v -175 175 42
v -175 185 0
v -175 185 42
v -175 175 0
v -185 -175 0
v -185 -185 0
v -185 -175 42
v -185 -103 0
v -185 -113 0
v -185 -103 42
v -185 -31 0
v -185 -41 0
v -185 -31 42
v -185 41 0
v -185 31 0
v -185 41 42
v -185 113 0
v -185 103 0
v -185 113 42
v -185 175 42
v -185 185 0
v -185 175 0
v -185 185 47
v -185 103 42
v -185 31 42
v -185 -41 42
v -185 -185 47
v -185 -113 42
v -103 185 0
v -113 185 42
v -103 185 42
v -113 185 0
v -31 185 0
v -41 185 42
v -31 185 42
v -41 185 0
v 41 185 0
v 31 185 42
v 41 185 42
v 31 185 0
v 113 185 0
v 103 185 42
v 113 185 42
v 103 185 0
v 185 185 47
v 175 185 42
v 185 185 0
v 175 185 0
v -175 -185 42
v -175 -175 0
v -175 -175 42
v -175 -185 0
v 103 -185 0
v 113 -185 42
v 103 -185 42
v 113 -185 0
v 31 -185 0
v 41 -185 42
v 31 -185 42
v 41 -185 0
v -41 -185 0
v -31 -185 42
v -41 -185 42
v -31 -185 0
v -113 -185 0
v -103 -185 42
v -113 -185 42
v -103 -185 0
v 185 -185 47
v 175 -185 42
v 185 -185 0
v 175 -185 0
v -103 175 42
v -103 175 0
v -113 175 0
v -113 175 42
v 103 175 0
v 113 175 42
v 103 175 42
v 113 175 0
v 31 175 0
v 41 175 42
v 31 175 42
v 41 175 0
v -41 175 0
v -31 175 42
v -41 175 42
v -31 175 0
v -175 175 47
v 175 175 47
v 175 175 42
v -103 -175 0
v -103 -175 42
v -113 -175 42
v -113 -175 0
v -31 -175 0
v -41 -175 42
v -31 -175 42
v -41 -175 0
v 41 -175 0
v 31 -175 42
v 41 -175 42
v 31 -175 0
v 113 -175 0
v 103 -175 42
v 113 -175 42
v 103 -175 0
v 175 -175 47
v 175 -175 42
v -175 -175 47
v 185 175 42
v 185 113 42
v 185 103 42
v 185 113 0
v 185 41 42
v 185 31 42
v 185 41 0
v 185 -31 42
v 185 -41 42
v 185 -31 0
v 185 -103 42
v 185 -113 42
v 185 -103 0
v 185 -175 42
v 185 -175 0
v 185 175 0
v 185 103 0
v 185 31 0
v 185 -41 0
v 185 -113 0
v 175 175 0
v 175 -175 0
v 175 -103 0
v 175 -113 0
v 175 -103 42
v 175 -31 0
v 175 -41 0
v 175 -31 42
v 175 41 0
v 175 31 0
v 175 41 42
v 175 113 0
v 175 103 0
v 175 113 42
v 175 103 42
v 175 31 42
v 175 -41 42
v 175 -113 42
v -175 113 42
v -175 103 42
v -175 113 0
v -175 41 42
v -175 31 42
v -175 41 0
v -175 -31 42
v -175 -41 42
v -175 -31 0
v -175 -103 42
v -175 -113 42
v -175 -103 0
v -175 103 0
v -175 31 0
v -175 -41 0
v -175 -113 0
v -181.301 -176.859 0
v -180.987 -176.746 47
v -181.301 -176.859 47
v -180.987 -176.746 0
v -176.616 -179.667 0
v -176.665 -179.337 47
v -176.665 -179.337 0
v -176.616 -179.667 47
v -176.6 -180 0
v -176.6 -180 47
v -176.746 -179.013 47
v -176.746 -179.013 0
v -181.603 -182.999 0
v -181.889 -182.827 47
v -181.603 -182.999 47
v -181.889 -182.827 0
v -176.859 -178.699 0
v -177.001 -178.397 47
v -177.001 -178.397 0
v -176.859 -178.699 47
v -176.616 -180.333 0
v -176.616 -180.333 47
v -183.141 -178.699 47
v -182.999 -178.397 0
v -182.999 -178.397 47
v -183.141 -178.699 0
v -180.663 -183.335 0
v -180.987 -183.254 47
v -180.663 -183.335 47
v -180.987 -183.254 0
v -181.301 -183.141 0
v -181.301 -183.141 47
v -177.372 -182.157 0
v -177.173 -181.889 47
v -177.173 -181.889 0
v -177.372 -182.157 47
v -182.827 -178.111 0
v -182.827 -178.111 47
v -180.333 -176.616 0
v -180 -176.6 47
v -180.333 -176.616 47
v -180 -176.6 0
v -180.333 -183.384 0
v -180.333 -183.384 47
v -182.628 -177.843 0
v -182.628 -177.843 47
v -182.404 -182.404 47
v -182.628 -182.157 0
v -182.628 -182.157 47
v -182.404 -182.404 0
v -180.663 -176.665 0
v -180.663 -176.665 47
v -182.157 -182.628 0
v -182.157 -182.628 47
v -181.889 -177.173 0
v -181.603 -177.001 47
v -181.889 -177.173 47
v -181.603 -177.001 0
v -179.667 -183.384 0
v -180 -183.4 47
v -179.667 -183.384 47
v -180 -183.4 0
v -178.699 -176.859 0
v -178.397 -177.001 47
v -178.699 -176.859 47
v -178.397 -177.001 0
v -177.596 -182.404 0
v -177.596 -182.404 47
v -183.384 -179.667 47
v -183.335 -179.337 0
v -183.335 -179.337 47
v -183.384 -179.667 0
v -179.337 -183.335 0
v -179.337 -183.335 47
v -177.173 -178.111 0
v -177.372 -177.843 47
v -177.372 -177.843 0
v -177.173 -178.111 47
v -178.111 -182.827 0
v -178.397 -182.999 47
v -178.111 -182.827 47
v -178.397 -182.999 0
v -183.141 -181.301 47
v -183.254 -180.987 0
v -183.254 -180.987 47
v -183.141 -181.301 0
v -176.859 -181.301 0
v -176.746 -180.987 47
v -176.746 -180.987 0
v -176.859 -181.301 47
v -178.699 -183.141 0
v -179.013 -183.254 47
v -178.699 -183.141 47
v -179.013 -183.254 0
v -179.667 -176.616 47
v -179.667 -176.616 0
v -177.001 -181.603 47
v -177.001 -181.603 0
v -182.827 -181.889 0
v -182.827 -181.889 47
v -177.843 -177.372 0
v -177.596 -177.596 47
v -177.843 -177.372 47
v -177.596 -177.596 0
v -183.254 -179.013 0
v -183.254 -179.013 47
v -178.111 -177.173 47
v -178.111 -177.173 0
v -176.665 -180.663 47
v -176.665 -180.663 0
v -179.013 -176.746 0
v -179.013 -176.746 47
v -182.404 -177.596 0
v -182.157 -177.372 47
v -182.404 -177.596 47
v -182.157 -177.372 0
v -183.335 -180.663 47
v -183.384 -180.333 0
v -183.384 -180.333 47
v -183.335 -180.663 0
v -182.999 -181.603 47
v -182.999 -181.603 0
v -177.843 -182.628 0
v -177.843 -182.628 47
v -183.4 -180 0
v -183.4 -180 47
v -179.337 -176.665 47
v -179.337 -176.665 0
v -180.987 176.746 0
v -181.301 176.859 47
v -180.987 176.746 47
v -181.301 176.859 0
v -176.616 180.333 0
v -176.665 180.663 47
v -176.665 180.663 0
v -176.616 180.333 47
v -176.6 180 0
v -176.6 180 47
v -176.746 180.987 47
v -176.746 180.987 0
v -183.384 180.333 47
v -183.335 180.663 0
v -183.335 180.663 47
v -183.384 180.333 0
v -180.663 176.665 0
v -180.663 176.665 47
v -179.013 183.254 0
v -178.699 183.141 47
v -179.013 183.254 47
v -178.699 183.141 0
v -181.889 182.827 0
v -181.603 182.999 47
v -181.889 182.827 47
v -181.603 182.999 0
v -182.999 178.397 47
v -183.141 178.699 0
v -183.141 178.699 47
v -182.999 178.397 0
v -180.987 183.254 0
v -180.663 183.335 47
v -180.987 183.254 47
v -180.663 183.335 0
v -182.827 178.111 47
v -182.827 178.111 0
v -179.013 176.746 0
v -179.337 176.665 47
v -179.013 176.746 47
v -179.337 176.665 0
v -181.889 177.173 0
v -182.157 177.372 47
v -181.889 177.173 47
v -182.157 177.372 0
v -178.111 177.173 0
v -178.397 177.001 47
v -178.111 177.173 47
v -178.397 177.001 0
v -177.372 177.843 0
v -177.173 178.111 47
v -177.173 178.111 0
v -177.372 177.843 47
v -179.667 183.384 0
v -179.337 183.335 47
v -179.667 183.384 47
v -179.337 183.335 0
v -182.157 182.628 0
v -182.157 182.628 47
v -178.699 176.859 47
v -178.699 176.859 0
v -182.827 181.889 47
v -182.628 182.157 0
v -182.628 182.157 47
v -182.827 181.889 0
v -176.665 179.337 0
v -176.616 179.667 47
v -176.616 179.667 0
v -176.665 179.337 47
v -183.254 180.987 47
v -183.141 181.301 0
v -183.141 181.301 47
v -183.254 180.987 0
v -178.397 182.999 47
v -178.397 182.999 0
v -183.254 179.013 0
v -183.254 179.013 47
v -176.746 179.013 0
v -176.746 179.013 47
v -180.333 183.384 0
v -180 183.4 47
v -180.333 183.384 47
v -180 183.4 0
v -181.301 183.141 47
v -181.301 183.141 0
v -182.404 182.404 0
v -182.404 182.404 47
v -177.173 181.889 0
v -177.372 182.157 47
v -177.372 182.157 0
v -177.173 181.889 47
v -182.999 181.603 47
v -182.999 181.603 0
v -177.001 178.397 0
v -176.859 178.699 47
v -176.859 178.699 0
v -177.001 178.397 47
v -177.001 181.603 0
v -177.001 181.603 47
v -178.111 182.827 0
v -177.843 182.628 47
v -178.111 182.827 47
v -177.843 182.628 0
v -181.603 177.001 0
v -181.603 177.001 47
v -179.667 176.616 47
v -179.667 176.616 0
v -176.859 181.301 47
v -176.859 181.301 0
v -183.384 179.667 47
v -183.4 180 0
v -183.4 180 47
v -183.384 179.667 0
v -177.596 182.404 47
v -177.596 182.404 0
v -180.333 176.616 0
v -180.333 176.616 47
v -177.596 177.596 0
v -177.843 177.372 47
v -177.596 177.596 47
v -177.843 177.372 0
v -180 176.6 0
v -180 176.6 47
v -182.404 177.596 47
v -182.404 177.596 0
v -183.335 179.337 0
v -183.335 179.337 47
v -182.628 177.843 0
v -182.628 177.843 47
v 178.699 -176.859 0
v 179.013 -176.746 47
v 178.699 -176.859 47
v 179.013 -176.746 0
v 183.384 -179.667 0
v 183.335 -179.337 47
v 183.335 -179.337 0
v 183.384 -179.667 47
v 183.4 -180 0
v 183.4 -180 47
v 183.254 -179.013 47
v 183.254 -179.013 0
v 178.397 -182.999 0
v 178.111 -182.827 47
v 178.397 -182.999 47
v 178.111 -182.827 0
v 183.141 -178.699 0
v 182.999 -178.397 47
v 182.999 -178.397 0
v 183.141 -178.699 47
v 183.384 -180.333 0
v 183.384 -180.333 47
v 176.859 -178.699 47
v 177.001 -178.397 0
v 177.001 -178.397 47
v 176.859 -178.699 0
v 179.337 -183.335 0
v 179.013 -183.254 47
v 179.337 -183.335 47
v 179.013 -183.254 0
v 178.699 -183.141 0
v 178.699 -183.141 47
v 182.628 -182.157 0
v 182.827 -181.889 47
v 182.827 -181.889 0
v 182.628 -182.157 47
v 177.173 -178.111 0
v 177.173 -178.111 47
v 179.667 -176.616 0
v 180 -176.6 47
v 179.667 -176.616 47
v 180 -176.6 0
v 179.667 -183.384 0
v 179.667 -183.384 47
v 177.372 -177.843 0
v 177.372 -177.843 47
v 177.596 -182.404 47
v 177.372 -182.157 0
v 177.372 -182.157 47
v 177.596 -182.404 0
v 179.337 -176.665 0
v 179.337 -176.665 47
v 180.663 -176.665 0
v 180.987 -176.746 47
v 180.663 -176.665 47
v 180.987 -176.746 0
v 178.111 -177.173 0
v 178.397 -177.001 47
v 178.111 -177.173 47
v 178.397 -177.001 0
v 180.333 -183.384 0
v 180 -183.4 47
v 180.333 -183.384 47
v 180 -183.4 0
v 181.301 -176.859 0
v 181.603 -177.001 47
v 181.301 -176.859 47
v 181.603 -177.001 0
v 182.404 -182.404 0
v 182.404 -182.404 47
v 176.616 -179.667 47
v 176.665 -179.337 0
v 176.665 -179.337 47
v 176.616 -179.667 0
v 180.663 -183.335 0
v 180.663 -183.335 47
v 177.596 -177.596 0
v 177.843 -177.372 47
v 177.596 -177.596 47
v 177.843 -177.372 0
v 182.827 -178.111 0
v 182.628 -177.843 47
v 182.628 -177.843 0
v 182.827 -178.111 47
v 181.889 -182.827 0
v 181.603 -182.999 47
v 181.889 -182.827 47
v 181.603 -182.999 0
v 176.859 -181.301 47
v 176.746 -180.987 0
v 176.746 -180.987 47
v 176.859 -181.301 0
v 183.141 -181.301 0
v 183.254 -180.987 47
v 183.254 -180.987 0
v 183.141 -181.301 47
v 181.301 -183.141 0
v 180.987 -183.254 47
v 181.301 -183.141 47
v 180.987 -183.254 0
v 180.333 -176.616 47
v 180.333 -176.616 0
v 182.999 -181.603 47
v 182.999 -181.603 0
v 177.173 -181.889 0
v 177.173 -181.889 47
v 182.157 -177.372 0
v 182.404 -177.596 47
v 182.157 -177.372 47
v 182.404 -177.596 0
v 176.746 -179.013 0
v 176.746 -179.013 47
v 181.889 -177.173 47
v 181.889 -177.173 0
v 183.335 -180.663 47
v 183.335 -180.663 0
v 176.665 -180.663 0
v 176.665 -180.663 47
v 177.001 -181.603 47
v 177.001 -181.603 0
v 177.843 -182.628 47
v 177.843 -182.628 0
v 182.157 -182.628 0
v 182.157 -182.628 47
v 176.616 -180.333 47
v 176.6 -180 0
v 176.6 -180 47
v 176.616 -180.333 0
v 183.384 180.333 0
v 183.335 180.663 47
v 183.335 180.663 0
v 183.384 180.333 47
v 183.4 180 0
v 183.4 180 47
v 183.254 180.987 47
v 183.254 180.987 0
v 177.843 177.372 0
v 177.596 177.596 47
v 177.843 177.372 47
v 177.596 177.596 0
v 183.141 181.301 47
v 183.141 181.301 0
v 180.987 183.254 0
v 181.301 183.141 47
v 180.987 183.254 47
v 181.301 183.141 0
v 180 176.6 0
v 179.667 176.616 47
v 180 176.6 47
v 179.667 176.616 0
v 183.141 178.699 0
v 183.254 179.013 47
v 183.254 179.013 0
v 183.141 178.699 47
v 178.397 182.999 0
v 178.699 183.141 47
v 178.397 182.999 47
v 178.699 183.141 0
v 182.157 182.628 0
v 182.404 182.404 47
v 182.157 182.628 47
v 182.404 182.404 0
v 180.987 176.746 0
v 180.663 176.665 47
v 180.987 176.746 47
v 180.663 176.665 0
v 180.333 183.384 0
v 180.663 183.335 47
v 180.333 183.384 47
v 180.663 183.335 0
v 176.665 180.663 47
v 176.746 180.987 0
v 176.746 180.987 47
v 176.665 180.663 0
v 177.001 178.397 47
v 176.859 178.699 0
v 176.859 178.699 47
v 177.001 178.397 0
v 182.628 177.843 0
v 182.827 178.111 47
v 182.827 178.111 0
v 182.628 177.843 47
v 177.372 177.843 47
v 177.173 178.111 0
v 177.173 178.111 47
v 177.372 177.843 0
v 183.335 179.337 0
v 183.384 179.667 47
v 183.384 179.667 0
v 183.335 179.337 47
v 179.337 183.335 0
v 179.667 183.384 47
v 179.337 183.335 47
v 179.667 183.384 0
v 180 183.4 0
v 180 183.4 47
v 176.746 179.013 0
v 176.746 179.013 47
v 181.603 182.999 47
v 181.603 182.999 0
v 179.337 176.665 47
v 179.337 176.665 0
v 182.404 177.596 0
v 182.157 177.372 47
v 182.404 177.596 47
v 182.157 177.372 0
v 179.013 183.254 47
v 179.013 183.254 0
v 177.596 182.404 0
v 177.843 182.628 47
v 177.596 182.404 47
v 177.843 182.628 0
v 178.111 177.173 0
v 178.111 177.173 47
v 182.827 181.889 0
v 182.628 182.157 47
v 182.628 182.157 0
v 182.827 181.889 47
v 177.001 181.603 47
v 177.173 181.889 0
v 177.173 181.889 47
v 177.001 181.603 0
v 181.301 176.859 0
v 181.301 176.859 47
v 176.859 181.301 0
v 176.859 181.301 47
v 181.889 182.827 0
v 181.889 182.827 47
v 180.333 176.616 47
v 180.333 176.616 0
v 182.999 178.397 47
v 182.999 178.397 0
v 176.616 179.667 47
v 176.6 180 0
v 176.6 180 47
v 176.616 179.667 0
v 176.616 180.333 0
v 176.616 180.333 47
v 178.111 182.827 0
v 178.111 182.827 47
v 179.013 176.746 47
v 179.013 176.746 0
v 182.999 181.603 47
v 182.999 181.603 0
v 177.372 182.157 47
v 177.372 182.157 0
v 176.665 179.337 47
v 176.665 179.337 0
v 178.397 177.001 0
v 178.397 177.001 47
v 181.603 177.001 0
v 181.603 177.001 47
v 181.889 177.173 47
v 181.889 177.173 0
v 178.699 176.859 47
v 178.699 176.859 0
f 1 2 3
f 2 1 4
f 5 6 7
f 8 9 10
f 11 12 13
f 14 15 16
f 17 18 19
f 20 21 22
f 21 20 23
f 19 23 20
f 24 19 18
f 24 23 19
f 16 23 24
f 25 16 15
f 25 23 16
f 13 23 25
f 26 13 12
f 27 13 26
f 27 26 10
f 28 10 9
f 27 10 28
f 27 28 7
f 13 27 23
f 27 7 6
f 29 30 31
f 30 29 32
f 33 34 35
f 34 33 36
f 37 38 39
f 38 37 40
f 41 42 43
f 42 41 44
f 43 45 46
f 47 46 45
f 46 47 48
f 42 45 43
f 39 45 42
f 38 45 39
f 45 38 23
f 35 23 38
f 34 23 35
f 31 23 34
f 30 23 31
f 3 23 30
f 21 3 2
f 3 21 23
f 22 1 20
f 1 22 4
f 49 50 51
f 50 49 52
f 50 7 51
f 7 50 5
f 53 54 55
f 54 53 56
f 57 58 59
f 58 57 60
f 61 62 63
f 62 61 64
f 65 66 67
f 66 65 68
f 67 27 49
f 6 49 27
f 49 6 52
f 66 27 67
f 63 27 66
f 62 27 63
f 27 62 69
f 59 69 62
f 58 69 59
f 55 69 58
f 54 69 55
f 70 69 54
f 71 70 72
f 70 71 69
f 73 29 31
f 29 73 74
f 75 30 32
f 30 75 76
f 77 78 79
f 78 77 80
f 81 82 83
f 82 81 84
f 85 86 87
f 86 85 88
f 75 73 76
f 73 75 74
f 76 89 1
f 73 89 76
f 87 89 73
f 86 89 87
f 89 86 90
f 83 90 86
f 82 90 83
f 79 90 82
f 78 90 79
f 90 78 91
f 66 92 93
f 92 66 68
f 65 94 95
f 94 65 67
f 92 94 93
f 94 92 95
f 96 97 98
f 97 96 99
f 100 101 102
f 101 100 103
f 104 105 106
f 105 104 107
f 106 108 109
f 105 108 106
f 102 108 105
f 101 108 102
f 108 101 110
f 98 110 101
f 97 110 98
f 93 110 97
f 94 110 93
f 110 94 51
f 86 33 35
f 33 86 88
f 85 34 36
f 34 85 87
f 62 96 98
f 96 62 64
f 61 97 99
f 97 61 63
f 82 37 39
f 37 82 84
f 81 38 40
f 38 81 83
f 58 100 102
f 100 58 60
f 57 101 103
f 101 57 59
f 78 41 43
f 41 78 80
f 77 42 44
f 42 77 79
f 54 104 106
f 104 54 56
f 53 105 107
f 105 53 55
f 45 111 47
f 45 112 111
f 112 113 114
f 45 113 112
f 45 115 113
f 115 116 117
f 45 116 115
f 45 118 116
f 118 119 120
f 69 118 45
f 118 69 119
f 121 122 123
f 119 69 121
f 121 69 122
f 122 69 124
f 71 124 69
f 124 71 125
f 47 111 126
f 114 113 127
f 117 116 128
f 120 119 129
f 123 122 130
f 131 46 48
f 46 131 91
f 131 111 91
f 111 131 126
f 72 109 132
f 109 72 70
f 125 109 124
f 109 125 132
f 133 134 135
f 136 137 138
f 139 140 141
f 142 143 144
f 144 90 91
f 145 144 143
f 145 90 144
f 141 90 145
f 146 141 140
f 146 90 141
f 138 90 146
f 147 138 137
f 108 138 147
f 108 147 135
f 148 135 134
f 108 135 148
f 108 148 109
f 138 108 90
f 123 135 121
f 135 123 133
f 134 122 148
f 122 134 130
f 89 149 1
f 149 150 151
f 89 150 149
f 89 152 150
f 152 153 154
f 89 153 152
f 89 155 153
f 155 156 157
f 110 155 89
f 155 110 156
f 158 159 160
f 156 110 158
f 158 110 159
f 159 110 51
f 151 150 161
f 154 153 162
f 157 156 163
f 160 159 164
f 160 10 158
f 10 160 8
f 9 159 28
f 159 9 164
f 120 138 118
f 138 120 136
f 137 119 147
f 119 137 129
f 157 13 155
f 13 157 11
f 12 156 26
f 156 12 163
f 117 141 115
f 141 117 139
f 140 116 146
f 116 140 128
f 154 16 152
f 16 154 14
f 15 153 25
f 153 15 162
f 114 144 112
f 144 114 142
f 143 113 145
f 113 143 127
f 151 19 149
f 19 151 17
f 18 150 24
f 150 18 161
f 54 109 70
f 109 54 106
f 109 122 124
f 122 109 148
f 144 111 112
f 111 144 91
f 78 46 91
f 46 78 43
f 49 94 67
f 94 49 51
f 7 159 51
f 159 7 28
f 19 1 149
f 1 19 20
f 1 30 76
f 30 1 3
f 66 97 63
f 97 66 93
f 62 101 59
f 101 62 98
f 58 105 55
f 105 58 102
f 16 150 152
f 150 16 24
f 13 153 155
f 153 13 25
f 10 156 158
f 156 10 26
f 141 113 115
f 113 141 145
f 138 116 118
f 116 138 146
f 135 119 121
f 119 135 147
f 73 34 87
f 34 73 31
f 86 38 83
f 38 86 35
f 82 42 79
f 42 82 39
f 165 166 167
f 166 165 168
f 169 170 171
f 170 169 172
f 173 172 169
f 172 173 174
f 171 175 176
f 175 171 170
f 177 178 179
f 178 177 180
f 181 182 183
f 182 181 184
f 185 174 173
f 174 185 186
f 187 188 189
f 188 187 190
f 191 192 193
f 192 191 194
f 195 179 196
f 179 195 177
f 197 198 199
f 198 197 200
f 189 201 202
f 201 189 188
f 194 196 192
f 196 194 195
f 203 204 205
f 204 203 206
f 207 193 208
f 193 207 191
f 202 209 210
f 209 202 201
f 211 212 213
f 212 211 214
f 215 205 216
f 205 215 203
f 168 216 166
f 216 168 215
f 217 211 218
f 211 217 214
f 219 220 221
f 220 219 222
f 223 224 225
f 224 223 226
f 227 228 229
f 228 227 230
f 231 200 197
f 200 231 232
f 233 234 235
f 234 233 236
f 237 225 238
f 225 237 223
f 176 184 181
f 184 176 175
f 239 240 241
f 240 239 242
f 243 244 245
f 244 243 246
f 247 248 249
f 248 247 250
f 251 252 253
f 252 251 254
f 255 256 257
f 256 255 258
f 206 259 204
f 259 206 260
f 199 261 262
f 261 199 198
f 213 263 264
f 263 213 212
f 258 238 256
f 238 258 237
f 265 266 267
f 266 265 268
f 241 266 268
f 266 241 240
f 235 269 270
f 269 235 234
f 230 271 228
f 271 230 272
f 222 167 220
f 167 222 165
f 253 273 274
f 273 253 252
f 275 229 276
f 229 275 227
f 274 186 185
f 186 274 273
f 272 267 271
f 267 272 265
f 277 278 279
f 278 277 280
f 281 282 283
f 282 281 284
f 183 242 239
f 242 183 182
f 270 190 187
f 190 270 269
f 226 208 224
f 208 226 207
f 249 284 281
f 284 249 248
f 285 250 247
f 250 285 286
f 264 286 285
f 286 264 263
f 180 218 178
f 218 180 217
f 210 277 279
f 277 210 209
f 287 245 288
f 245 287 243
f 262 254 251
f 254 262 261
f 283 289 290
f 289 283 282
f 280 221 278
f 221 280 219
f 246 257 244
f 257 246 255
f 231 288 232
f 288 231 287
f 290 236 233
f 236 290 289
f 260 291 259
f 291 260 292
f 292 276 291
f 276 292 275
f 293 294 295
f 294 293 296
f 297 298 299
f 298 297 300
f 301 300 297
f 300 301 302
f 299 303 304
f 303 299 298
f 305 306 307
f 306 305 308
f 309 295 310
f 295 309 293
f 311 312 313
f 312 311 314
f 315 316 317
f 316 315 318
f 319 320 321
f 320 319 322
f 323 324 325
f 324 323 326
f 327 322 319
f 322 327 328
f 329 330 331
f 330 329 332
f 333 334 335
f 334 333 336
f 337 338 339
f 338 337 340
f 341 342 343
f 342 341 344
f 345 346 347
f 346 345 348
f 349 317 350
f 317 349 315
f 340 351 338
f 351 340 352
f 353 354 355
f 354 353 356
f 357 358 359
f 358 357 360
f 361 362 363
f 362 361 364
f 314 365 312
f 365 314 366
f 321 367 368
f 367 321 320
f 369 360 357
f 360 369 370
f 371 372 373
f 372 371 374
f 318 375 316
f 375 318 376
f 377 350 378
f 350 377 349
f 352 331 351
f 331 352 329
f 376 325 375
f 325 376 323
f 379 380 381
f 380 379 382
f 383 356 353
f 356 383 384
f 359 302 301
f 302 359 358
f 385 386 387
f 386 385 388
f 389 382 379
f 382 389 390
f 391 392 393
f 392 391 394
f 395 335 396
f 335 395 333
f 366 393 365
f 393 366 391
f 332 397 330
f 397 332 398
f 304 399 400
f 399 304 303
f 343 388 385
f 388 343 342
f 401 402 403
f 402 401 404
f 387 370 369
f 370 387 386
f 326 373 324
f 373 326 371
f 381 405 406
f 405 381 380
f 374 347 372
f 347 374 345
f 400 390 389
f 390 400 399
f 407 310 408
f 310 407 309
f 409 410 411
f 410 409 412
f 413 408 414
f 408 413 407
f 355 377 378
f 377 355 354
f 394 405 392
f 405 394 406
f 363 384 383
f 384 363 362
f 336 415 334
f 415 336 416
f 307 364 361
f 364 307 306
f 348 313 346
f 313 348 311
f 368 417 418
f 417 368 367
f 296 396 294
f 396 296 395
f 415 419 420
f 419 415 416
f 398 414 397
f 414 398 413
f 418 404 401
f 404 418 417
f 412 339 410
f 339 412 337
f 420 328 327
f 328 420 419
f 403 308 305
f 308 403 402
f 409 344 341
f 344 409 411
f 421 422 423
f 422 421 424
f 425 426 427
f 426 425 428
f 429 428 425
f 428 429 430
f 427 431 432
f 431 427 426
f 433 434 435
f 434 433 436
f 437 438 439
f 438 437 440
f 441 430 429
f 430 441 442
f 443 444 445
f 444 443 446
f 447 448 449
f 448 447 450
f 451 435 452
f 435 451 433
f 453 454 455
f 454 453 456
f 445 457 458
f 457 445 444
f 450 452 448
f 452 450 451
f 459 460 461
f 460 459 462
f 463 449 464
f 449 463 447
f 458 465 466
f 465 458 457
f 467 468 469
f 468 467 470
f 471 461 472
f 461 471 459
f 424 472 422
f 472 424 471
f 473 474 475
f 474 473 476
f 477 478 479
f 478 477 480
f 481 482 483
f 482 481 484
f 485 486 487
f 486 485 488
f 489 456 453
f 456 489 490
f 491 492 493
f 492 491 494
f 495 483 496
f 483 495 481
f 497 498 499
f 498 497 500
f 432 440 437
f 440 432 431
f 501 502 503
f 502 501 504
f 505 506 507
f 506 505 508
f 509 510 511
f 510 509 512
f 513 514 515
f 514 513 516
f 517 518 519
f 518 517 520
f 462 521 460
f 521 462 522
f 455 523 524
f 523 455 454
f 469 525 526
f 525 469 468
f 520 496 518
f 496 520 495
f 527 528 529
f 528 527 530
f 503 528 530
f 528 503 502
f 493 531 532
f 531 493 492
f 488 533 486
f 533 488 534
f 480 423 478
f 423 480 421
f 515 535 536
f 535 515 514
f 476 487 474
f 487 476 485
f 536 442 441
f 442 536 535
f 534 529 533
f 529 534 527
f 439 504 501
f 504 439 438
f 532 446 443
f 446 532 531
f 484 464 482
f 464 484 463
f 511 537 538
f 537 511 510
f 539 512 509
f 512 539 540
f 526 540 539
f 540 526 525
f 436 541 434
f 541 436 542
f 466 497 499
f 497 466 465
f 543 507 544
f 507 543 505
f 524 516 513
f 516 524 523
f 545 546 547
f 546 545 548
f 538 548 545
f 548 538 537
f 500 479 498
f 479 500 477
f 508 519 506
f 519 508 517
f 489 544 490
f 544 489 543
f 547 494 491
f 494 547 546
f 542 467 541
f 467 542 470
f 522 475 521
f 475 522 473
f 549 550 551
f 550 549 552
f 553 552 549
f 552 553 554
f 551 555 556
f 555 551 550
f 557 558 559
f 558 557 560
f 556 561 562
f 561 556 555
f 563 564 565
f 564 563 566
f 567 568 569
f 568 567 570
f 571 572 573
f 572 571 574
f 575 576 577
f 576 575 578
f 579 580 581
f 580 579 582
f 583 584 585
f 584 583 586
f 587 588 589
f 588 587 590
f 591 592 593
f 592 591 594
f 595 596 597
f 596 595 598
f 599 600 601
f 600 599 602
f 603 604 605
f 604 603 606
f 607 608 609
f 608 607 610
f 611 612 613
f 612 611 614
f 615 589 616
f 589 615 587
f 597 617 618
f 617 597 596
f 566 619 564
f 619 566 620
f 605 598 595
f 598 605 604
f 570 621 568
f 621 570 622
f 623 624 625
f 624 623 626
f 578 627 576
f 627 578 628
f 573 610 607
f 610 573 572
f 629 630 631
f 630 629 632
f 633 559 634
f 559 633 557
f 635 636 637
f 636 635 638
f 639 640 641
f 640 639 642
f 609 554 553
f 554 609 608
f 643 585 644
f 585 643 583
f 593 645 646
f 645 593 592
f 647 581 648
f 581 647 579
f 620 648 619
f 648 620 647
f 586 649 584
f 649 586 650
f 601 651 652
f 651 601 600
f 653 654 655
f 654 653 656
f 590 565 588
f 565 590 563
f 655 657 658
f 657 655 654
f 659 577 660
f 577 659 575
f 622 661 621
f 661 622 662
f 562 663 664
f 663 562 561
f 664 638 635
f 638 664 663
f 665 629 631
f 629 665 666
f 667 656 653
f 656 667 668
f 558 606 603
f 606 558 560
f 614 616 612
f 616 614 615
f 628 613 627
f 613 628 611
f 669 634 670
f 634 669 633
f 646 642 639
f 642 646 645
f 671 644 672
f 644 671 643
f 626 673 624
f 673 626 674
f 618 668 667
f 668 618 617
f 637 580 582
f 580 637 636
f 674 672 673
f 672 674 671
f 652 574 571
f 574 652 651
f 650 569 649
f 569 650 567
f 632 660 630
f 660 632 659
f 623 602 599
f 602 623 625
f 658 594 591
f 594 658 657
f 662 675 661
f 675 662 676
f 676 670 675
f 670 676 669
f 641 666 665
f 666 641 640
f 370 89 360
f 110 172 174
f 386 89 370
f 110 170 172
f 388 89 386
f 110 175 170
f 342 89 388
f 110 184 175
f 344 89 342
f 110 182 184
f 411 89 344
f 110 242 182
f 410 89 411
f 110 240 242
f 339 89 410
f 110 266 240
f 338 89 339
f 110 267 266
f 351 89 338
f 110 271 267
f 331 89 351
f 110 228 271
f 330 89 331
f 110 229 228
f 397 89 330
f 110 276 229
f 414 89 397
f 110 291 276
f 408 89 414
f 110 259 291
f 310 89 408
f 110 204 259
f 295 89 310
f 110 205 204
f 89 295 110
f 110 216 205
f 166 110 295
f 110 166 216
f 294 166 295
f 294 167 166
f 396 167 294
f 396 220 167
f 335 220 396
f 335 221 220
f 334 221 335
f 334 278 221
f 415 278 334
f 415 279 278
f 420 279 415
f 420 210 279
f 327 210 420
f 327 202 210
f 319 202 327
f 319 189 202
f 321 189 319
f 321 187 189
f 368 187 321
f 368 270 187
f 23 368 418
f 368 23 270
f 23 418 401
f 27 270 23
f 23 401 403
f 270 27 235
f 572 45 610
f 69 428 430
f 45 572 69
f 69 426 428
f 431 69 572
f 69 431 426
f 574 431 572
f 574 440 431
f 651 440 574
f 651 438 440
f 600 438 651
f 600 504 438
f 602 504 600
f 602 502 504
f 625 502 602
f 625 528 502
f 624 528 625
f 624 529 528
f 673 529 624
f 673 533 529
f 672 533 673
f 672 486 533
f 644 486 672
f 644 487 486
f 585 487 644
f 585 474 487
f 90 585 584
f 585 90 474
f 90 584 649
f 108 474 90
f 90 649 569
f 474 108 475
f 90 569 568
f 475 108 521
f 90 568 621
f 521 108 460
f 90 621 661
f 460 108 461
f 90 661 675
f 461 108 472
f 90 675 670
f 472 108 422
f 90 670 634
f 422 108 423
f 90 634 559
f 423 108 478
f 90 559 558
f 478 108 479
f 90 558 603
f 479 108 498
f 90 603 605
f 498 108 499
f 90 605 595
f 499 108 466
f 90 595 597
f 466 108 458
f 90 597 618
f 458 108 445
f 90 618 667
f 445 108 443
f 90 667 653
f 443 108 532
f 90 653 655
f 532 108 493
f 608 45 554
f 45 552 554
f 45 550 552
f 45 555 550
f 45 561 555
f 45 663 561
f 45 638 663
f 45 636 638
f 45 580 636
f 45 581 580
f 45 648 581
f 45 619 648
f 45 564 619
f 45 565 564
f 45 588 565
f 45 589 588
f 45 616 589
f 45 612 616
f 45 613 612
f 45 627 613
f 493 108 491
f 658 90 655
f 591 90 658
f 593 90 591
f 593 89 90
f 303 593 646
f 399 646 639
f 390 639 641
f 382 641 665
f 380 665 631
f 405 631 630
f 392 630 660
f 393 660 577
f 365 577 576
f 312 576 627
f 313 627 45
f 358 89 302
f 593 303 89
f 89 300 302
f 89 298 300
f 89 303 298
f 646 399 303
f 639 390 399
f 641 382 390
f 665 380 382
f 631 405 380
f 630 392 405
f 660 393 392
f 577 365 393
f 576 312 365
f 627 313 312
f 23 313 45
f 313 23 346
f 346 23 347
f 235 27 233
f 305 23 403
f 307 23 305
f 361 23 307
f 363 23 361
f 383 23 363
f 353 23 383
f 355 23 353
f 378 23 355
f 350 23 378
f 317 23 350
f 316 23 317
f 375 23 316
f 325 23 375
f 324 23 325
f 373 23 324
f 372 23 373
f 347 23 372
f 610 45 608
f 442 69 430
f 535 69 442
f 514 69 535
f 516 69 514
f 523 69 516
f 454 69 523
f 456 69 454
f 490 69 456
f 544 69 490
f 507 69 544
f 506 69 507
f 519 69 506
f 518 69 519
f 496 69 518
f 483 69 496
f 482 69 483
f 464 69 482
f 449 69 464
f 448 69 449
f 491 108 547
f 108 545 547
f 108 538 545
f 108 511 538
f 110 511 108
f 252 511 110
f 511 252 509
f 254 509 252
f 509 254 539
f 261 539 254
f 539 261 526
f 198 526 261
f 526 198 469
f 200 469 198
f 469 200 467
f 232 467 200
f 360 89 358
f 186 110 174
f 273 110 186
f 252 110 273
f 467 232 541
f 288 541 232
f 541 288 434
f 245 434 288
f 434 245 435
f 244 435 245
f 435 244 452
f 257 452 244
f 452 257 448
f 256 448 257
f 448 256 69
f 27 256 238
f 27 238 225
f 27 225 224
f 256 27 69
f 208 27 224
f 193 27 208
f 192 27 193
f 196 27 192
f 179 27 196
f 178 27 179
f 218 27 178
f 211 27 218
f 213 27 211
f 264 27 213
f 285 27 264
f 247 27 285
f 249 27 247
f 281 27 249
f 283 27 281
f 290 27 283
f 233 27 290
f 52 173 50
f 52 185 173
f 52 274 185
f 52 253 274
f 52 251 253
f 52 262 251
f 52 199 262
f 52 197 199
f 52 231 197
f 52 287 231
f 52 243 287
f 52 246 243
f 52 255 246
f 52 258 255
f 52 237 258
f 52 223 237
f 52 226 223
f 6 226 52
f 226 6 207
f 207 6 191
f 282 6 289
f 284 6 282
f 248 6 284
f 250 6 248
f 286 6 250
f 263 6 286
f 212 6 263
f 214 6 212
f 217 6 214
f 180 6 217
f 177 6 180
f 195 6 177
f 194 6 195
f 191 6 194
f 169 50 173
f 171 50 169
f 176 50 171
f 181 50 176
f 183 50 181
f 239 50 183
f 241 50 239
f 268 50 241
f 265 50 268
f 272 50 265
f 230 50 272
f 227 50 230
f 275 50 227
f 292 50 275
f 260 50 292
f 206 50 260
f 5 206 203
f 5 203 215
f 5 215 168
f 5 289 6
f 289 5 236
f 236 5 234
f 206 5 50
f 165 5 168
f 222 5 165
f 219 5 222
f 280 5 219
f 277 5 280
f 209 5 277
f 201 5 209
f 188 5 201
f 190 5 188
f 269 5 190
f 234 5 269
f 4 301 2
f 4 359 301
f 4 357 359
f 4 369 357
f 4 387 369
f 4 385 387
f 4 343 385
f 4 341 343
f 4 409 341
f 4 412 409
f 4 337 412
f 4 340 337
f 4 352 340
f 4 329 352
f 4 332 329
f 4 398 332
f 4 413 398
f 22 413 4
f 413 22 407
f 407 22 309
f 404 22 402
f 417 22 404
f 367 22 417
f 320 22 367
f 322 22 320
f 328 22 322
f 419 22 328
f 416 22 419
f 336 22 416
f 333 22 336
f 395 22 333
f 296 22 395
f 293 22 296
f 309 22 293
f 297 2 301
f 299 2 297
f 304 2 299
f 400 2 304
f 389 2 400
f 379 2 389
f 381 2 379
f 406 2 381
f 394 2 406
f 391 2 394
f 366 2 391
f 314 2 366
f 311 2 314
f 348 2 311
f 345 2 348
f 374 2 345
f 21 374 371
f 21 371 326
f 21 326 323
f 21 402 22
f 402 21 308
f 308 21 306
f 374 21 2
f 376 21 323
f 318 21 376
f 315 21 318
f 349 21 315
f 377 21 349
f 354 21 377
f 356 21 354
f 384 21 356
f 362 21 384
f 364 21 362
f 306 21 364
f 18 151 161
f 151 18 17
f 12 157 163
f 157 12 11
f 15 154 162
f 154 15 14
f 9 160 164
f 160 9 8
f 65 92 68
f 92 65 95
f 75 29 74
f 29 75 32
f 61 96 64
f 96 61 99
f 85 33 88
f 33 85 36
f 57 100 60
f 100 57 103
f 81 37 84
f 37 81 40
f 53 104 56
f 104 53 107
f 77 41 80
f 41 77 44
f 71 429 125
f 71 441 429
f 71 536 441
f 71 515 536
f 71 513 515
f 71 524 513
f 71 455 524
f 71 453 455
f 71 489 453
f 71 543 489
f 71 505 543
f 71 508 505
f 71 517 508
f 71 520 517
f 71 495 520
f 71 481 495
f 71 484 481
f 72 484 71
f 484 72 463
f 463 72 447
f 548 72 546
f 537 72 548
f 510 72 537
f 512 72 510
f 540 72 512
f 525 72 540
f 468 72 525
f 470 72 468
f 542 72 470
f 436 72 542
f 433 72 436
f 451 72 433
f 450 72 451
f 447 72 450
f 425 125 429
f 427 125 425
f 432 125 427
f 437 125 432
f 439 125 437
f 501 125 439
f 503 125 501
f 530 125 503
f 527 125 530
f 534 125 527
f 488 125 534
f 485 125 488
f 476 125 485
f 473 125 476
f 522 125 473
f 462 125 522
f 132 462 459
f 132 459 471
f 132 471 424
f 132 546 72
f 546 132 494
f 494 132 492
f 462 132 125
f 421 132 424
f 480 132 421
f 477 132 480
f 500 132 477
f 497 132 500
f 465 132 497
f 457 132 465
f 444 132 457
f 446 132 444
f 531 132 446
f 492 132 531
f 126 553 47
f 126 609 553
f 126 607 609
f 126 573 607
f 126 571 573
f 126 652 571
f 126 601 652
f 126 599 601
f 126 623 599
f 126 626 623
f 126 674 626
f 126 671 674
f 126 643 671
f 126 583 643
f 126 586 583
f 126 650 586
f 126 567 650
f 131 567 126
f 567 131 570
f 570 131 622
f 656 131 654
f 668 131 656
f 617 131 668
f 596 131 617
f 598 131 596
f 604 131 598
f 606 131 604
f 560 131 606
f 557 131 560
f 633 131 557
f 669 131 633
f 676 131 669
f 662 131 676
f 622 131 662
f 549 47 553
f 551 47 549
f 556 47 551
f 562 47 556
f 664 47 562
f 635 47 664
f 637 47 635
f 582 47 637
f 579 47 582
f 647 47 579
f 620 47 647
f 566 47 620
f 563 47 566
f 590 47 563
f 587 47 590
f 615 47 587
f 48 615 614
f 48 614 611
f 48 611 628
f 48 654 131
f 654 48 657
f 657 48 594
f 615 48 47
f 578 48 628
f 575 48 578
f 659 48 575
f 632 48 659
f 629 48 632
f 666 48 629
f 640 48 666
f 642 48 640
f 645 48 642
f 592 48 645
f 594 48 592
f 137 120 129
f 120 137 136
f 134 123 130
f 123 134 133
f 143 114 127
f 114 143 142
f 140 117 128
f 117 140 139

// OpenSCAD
// Cage slice part (z0..z1). Units: mm.
// Print orientation: normal

bar=10;
inner=[350,350,700];
gap_xy=62;
gap_z=61;
hole_d=6.8;
$fn=64;

outer=[inner[0]+2*bar, inner[1]+2*bar, inner[2]+2*bar];
half=[outer[0]/2, outer[1]/2, outer[2]/2];

pitch_xy=bar+gap_xy;
pitch_z=bar+gap_z;

centers=[for(i=[0:5]) -(half[0]-bar/2) + i*pitch_xy];
z_levels=[for(i=[0:10]) i*pitch_z];

module vbar(xc,yc){ translate([xc-bar/2,yc-bar/2,0]) cube([bar,bar,outer[2]],center=false); }
module hbar_x(yc,z0){ translate([-half[0],yc-bar/2,z0]) cube([outer[0],bar,bar],center=false); }
module hbar_y(xc,z0){ translate([xc-bar/2,-half[1],z0]) cube([bar,outer[1],bar],center=false); }

module grid(z0){ union(){ for(yc=centers) hbar_x(yc,z0); for(xc=centers) hbar_y(xc,z0); } }

module side_verticals(){
  union(){
    for(xc=centers){ vbar(xc, half[1]-bar/2); vbar(xc,-half[1]+bar/2); }
    for(yc=centers){ vbar( half[0]-bar/2,yc); vbar(-half[0]+bar/2,yc); }
  }
}

module side_rings(){
  union(){
    for(z0=z_levels){
      hbar_x( half[1]-bar/2,z0); hbar_x(-half[1]+bar/2,z0);
      hbar_y( half[0]-bar/2,z0); hbar_y(-half[0]+bar/2,z0);
    }
  }
}

module rod_holes(){
  for(sx=[-1,1],sy=[-1,1]) translate([sx*(half[0]-bar/2), sy*(half[1]-bar/2), -1]) cylinder(d=hole_d,h=outer[2]+2,center=false);
}

module cage(){ difference(){ union(){ side_verticals(); side_rings(); grid(0); grid(outer[2]-bar); } rod_holes(); } }

module cage_slice(zmin,zmax){ intersection(){ cage(); translate([-1000,-1000,zmin]) cube([2000,2000,zmax-zmin],center=false); } }

z0=597; z1=644;
translate([0,0,-z0]) cage_slice(z0,z1);
